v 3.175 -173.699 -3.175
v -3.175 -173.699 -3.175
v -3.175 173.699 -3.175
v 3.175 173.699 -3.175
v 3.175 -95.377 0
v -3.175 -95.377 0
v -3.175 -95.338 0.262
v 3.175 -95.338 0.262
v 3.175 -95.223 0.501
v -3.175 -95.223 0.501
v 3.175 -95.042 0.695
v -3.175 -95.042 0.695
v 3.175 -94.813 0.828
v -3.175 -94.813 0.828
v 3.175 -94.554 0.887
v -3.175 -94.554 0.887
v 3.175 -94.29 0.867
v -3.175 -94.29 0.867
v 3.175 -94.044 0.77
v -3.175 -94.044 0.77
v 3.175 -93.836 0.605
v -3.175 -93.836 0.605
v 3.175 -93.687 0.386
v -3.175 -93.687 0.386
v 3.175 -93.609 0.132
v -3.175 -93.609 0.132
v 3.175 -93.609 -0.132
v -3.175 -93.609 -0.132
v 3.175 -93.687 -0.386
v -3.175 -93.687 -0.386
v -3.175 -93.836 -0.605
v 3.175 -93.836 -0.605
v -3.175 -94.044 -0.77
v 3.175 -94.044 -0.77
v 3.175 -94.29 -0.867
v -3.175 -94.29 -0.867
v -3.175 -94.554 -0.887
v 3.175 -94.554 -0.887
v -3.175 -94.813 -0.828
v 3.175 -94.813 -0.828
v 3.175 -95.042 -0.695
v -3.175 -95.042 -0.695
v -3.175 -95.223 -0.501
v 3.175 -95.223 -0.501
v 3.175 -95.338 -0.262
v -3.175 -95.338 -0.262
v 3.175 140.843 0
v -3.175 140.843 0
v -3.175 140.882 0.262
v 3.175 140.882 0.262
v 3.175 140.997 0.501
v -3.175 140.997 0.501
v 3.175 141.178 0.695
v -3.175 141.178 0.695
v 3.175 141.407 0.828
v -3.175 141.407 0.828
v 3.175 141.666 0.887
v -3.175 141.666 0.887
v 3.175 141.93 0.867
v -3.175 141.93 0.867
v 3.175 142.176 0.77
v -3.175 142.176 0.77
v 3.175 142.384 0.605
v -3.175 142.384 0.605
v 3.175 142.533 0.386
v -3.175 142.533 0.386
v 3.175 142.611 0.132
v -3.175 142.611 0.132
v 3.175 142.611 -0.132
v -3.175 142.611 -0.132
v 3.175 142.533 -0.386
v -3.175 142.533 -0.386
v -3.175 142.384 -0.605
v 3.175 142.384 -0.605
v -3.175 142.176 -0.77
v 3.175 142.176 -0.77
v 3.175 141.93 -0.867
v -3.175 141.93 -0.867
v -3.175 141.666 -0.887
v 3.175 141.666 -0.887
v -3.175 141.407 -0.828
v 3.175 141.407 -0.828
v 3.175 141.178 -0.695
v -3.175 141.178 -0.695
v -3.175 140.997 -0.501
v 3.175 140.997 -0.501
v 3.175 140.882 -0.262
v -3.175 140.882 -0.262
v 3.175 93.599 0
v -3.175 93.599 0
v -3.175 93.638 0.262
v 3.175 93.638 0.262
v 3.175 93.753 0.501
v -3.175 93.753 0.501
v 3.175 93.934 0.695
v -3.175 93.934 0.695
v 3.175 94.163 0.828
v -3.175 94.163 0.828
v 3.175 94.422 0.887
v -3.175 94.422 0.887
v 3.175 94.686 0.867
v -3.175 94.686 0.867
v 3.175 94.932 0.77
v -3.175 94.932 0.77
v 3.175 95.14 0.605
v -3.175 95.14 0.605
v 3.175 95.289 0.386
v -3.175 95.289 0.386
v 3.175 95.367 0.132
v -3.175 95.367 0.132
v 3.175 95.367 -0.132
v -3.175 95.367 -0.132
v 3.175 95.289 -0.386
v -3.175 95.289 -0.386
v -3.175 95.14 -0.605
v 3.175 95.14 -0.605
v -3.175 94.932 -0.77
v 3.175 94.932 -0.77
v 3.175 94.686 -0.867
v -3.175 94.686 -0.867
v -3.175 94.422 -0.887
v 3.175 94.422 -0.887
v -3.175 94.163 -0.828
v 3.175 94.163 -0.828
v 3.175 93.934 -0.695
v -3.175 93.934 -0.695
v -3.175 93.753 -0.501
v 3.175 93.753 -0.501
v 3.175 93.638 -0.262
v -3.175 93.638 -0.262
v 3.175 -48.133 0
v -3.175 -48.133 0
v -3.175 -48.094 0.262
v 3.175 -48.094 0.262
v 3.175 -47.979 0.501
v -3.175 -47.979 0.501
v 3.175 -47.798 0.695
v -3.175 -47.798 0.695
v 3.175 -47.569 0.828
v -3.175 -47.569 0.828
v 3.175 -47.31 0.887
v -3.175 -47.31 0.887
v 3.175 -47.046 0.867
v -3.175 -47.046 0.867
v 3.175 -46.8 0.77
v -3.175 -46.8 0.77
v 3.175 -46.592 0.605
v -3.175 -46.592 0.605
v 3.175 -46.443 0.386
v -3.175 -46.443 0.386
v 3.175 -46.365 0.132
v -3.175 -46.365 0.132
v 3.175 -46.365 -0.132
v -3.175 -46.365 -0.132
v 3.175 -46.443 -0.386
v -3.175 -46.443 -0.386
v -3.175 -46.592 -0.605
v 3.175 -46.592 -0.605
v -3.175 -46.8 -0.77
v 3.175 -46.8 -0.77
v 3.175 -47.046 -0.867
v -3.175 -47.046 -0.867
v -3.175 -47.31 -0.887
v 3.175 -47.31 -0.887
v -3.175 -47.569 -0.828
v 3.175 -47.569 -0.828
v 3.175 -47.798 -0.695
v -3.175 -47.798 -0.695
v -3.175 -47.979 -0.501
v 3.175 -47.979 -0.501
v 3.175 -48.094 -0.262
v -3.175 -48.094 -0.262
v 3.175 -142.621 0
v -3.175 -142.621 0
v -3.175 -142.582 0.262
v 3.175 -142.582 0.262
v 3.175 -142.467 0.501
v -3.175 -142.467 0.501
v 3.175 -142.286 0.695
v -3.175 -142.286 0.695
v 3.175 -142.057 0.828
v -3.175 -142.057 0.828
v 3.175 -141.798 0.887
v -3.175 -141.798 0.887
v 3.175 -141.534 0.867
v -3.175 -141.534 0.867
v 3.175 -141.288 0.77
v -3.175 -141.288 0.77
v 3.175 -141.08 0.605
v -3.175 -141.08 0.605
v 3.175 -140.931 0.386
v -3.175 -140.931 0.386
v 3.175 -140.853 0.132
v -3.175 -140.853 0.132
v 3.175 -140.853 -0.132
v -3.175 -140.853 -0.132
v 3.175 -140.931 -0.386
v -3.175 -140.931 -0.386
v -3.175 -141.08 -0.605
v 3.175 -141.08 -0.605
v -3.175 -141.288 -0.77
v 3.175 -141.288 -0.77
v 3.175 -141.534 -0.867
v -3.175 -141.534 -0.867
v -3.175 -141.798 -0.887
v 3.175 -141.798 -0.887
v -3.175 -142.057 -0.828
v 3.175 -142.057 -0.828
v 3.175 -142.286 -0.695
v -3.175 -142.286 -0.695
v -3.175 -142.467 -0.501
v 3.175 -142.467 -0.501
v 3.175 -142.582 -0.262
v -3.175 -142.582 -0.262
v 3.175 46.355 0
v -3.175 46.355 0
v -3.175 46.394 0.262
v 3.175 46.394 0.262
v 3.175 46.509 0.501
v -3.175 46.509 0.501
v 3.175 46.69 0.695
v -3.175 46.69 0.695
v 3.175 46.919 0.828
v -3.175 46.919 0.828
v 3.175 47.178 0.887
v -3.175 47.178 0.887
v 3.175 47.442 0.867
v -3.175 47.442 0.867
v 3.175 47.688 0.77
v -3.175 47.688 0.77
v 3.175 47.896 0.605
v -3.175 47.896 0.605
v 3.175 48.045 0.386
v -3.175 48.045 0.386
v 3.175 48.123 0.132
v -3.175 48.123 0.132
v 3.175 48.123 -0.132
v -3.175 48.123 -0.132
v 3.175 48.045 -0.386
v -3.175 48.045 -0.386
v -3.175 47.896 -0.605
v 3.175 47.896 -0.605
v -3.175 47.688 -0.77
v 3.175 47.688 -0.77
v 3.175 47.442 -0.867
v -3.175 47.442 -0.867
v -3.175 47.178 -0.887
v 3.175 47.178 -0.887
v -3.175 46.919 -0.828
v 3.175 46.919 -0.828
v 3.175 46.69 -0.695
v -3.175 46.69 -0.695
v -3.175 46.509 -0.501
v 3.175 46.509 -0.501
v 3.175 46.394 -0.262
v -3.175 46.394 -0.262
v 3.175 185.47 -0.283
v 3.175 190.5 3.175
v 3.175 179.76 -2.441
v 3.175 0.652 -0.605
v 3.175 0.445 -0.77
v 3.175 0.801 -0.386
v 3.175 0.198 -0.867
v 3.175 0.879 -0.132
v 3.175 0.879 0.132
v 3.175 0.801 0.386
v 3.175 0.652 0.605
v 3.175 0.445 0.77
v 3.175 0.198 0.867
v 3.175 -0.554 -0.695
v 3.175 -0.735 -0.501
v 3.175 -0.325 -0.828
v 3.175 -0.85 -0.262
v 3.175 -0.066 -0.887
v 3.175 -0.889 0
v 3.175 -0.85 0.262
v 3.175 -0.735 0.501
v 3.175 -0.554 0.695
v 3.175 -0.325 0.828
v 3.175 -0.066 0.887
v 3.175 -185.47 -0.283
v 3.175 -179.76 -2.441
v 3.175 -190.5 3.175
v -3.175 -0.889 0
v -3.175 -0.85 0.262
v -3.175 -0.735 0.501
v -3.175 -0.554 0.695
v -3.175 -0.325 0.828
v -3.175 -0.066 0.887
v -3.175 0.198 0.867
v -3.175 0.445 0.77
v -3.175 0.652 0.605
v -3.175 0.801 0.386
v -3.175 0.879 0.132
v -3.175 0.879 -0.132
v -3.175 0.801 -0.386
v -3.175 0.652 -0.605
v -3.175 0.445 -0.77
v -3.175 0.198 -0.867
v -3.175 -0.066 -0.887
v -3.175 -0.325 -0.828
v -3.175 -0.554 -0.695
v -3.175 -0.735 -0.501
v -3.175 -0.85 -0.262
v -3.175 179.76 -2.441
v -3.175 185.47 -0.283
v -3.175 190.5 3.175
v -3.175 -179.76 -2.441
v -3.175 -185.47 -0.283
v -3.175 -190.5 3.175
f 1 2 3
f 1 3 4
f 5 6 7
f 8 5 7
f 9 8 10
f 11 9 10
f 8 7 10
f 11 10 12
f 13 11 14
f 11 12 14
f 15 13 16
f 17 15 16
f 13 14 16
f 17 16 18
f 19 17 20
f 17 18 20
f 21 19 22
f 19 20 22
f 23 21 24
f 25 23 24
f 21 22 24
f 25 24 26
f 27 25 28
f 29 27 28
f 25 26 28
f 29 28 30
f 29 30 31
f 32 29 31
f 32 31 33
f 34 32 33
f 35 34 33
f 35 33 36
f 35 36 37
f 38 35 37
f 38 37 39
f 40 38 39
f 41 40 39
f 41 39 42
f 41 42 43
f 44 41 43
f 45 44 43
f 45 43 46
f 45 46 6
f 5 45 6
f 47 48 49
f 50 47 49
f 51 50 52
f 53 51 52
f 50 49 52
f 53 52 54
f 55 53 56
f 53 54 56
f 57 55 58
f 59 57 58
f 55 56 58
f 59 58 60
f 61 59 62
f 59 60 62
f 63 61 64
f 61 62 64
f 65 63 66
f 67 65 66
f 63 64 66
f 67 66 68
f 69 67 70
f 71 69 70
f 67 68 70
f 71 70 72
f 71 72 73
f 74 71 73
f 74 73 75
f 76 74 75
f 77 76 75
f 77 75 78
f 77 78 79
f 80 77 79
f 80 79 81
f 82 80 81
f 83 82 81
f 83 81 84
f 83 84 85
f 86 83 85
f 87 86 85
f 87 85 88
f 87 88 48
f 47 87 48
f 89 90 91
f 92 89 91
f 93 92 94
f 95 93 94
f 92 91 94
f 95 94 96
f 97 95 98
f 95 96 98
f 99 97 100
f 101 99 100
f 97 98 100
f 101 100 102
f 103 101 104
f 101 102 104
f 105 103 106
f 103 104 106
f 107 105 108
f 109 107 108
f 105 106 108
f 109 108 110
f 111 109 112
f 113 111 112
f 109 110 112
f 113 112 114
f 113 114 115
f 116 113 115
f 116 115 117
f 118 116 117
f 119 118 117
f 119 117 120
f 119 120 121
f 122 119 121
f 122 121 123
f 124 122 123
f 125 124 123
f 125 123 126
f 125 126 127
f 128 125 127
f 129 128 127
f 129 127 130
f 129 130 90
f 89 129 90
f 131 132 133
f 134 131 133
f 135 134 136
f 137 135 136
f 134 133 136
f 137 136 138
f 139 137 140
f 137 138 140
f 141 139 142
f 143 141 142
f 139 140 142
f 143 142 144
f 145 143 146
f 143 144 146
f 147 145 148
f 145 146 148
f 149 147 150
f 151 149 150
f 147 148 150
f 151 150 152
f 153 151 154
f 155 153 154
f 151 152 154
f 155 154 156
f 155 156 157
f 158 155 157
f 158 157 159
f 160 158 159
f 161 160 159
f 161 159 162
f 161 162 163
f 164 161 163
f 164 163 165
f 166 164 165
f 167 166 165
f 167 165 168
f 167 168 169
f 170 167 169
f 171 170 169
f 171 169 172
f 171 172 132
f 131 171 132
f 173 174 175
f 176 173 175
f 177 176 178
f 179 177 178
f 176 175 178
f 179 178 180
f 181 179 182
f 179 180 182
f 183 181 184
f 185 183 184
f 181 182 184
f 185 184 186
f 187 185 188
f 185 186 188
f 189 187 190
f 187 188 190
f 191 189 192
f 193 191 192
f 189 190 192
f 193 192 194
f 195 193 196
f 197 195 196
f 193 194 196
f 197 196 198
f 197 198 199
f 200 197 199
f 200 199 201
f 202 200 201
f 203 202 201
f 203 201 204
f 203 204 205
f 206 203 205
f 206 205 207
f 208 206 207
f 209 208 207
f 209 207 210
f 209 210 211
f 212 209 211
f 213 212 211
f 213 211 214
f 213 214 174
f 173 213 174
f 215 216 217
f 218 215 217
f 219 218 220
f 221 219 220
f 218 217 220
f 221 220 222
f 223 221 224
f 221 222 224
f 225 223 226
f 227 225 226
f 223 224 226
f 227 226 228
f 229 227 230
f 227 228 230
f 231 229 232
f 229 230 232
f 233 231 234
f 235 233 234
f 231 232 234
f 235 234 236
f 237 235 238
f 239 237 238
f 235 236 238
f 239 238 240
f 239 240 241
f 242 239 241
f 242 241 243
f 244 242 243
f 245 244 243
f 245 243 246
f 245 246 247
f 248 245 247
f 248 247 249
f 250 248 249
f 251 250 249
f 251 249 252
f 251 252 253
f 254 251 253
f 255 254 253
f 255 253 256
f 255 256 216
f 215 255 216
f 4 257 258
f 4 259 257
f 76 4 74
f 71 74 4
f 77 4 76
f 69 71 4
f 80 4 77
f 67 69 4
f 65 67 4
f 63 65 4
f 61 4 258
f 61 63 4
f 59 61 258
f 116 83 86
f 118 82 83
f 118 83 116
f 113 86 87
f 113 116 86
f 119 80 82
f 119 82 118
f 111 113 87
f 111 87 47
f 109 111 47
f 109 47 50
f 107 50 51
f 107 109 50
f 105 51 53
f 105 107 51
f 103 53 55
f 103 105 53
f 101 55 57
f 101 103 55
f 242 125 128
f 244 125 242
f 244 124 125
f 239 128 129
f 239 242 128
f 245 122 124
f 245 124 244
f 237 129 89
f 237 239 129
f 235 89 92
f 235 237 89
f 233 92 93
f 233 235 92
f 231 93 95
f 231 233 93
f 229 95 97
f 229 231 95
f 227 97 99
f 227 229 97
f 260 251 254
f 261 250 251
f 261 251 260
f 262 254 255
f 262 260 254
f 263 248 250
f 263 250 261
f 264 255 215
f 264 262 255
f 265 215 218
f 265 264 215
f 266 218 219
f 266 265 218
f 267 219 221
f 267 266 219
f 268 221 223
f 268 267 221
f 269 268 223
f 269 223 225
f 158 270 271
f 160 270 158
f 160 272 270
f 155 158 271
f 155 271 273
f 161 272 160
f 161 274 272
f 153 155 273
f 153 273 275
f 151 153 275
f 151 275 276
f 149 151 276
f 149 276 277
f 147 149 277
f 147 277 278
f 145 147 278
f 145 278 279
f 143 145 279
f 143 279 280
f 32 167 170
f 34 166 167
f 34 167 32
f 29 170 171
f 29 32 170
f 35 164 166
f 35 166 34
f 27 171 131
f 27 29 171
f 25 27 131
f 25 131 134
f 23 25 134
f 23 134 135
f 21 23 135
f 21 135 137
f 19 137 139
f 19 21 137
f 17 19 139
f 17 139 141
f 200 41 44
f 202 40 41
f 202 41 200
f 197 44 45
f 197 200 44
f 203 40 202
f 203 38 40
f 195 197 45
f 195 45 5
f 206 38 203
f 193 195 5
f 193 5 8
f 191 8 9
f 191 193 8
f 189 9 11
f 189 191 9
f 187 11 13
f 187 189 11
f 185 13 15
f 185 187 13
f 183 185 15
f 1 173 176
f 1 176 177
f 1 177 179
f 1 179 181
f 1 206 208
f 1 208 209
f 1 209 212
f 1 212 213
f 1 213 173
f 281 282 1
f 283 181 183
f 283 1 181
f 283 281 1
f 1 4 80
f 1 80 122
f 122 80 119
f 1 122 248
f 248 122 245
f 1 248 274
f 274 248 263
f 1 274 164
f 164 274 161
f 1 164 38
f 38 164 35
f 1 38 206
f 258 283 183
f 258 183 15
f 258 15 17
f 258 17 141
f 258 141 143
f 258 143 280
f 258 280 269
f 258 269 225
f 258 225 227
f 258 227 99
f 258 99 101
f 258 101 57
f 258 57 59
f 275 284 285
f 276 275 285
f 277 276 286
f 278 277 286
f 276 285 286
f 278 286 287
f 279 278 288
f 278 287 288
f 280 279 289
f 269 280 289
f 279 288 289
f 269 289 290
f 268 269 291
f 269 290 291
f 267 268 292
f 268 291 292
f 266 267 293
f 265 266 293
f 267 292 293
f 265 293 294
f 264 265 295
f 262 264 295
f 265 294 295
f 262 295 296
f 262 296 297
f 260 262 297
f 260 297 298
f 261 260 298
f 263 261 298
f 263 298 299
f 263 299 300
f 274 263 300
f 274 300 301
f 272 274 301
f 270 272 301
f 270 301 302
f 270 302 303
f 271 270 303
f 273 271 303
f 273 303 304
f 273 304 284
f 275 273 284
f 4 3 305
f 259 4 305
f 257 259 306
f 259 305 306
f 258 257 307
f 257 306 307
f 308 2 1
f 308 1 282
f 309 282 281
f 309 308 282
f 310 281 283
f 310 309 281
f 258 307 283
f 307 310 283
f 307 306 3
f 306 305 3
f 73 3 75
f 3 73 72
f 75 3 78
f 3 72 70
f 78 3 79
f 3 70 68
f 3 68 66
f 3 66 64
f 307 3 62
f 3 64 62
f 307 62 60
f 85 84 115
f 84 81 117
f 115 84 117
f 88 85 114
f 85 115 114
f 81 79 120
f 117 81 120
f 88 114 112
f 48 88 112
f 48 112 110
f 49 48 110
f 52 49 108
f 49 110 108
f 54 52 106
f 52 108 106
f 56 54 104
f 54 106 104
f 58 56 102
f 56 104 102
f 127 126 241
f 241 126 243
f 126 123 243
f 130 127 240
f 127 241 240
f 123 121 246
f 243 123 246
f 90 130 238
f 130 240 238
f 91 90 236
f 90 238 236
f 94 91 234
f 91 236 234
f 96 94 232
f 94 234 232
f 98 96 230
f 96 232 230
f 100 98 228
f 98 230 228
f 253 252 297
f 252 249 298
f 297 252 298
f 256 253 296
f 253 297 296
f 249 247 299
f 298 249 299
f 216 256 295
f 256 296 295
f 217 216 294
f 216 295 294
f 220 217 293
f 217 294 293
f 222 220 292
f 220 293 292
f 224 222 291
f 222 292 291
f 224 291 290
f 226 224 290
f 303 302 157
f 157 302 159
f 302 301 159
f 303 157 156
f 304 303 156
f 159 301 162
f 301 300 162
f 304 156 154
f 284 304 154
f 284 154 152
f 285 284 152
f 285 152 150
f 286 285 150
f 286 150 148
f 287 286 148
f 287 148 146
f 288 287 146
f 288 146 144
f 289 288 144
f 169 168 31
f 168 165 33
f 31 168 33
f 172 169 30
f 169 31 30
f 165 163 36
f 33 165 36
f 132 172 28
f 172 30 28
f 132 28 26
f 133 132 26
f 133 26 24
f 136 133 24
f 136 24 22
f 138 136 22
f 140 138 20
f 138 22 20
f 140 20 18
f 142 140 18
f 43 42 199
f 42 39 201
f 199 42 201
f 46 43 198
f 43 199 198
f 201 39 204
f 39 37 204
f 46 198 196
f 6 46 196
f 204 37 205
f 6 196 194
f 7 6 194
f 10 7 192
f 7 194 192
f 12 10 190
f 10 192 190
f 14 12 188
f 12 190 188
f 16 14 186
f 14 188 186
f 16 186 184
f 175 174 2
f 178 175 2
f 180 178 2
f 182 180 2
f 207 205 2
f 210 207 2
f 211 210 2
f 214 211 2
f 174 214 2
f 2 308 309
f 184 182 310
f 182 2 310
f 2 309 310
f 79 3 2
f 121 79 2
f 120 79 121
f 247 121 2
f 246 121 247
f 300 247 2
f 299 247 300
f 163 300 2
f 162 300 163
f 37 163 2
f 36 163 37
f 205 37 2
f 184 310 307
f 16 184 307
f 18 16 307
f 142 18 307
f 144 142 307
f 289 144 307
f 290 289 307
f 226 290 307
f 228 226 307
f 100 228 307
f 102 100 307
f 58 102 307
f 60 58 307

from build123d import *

# Parameters (mm, degrees)
F0_W        = 6.35
F0_H        = 6.35
F1_DEPTH    = 190.5
F2_T1_DEPTH = 90.3526041263
F4_D        = 1.778


# Not quite as in the source:
# - a fillet or chamfer that OpenCascade refuses, or shapes differently, is made with other operations: its cross-section is extruded or revolved along the edge and cut away or added


with BuildPart() as f1:
    # F0 (on Front) → F1 (new body, symmetric)
    with BuildSketch(Plane.XZ):
        Rectangle(F0_W, F0_H)
    extrude(amount=F1_DEPTH, both=True)

    # F2: fillet of radius 25.4 on 2 edges, made by hand

    # F2_s2 → F2_t1 (cut)
    with BuildSketch(Plane.YZ.offset(-45.1763020632)):
        with BuildLine():
            ThreePointArc((-173.6994791747, -3.175), (-182.6797352958, -1.534524406), (-190.5, 3.175))
            Line((-190.5, 3.175), (-190.5, -3.175))
            Line((-190.5, -3.175), (-173.6994791747, -3.175))
        make_face()
        with BuildLine():
            ThreePointArc((173.6994791747, -3.175), (182.6797352958, -1.534524406), (190.5, 3.175))
            Line((190.5, 3.175), (190.5, -3.175))
            Line((190.5, -3.175), (173.6994791747, -3.175))
        make_face()
    extrude(amount=F2_T1_DEPTH, mode=Mode.SUBTRACT)

    # F4 (through all)
    with Locations(Plane.YZ.offset(3.175)):
        with Locations((47.244, 0), (94.488, 0), (141.732, 0), (0, 0), (-47.244, 0), (-94.488, 0), (-141.732, 0)):
            Hole(F4_D / 2)


solid = f1.part
